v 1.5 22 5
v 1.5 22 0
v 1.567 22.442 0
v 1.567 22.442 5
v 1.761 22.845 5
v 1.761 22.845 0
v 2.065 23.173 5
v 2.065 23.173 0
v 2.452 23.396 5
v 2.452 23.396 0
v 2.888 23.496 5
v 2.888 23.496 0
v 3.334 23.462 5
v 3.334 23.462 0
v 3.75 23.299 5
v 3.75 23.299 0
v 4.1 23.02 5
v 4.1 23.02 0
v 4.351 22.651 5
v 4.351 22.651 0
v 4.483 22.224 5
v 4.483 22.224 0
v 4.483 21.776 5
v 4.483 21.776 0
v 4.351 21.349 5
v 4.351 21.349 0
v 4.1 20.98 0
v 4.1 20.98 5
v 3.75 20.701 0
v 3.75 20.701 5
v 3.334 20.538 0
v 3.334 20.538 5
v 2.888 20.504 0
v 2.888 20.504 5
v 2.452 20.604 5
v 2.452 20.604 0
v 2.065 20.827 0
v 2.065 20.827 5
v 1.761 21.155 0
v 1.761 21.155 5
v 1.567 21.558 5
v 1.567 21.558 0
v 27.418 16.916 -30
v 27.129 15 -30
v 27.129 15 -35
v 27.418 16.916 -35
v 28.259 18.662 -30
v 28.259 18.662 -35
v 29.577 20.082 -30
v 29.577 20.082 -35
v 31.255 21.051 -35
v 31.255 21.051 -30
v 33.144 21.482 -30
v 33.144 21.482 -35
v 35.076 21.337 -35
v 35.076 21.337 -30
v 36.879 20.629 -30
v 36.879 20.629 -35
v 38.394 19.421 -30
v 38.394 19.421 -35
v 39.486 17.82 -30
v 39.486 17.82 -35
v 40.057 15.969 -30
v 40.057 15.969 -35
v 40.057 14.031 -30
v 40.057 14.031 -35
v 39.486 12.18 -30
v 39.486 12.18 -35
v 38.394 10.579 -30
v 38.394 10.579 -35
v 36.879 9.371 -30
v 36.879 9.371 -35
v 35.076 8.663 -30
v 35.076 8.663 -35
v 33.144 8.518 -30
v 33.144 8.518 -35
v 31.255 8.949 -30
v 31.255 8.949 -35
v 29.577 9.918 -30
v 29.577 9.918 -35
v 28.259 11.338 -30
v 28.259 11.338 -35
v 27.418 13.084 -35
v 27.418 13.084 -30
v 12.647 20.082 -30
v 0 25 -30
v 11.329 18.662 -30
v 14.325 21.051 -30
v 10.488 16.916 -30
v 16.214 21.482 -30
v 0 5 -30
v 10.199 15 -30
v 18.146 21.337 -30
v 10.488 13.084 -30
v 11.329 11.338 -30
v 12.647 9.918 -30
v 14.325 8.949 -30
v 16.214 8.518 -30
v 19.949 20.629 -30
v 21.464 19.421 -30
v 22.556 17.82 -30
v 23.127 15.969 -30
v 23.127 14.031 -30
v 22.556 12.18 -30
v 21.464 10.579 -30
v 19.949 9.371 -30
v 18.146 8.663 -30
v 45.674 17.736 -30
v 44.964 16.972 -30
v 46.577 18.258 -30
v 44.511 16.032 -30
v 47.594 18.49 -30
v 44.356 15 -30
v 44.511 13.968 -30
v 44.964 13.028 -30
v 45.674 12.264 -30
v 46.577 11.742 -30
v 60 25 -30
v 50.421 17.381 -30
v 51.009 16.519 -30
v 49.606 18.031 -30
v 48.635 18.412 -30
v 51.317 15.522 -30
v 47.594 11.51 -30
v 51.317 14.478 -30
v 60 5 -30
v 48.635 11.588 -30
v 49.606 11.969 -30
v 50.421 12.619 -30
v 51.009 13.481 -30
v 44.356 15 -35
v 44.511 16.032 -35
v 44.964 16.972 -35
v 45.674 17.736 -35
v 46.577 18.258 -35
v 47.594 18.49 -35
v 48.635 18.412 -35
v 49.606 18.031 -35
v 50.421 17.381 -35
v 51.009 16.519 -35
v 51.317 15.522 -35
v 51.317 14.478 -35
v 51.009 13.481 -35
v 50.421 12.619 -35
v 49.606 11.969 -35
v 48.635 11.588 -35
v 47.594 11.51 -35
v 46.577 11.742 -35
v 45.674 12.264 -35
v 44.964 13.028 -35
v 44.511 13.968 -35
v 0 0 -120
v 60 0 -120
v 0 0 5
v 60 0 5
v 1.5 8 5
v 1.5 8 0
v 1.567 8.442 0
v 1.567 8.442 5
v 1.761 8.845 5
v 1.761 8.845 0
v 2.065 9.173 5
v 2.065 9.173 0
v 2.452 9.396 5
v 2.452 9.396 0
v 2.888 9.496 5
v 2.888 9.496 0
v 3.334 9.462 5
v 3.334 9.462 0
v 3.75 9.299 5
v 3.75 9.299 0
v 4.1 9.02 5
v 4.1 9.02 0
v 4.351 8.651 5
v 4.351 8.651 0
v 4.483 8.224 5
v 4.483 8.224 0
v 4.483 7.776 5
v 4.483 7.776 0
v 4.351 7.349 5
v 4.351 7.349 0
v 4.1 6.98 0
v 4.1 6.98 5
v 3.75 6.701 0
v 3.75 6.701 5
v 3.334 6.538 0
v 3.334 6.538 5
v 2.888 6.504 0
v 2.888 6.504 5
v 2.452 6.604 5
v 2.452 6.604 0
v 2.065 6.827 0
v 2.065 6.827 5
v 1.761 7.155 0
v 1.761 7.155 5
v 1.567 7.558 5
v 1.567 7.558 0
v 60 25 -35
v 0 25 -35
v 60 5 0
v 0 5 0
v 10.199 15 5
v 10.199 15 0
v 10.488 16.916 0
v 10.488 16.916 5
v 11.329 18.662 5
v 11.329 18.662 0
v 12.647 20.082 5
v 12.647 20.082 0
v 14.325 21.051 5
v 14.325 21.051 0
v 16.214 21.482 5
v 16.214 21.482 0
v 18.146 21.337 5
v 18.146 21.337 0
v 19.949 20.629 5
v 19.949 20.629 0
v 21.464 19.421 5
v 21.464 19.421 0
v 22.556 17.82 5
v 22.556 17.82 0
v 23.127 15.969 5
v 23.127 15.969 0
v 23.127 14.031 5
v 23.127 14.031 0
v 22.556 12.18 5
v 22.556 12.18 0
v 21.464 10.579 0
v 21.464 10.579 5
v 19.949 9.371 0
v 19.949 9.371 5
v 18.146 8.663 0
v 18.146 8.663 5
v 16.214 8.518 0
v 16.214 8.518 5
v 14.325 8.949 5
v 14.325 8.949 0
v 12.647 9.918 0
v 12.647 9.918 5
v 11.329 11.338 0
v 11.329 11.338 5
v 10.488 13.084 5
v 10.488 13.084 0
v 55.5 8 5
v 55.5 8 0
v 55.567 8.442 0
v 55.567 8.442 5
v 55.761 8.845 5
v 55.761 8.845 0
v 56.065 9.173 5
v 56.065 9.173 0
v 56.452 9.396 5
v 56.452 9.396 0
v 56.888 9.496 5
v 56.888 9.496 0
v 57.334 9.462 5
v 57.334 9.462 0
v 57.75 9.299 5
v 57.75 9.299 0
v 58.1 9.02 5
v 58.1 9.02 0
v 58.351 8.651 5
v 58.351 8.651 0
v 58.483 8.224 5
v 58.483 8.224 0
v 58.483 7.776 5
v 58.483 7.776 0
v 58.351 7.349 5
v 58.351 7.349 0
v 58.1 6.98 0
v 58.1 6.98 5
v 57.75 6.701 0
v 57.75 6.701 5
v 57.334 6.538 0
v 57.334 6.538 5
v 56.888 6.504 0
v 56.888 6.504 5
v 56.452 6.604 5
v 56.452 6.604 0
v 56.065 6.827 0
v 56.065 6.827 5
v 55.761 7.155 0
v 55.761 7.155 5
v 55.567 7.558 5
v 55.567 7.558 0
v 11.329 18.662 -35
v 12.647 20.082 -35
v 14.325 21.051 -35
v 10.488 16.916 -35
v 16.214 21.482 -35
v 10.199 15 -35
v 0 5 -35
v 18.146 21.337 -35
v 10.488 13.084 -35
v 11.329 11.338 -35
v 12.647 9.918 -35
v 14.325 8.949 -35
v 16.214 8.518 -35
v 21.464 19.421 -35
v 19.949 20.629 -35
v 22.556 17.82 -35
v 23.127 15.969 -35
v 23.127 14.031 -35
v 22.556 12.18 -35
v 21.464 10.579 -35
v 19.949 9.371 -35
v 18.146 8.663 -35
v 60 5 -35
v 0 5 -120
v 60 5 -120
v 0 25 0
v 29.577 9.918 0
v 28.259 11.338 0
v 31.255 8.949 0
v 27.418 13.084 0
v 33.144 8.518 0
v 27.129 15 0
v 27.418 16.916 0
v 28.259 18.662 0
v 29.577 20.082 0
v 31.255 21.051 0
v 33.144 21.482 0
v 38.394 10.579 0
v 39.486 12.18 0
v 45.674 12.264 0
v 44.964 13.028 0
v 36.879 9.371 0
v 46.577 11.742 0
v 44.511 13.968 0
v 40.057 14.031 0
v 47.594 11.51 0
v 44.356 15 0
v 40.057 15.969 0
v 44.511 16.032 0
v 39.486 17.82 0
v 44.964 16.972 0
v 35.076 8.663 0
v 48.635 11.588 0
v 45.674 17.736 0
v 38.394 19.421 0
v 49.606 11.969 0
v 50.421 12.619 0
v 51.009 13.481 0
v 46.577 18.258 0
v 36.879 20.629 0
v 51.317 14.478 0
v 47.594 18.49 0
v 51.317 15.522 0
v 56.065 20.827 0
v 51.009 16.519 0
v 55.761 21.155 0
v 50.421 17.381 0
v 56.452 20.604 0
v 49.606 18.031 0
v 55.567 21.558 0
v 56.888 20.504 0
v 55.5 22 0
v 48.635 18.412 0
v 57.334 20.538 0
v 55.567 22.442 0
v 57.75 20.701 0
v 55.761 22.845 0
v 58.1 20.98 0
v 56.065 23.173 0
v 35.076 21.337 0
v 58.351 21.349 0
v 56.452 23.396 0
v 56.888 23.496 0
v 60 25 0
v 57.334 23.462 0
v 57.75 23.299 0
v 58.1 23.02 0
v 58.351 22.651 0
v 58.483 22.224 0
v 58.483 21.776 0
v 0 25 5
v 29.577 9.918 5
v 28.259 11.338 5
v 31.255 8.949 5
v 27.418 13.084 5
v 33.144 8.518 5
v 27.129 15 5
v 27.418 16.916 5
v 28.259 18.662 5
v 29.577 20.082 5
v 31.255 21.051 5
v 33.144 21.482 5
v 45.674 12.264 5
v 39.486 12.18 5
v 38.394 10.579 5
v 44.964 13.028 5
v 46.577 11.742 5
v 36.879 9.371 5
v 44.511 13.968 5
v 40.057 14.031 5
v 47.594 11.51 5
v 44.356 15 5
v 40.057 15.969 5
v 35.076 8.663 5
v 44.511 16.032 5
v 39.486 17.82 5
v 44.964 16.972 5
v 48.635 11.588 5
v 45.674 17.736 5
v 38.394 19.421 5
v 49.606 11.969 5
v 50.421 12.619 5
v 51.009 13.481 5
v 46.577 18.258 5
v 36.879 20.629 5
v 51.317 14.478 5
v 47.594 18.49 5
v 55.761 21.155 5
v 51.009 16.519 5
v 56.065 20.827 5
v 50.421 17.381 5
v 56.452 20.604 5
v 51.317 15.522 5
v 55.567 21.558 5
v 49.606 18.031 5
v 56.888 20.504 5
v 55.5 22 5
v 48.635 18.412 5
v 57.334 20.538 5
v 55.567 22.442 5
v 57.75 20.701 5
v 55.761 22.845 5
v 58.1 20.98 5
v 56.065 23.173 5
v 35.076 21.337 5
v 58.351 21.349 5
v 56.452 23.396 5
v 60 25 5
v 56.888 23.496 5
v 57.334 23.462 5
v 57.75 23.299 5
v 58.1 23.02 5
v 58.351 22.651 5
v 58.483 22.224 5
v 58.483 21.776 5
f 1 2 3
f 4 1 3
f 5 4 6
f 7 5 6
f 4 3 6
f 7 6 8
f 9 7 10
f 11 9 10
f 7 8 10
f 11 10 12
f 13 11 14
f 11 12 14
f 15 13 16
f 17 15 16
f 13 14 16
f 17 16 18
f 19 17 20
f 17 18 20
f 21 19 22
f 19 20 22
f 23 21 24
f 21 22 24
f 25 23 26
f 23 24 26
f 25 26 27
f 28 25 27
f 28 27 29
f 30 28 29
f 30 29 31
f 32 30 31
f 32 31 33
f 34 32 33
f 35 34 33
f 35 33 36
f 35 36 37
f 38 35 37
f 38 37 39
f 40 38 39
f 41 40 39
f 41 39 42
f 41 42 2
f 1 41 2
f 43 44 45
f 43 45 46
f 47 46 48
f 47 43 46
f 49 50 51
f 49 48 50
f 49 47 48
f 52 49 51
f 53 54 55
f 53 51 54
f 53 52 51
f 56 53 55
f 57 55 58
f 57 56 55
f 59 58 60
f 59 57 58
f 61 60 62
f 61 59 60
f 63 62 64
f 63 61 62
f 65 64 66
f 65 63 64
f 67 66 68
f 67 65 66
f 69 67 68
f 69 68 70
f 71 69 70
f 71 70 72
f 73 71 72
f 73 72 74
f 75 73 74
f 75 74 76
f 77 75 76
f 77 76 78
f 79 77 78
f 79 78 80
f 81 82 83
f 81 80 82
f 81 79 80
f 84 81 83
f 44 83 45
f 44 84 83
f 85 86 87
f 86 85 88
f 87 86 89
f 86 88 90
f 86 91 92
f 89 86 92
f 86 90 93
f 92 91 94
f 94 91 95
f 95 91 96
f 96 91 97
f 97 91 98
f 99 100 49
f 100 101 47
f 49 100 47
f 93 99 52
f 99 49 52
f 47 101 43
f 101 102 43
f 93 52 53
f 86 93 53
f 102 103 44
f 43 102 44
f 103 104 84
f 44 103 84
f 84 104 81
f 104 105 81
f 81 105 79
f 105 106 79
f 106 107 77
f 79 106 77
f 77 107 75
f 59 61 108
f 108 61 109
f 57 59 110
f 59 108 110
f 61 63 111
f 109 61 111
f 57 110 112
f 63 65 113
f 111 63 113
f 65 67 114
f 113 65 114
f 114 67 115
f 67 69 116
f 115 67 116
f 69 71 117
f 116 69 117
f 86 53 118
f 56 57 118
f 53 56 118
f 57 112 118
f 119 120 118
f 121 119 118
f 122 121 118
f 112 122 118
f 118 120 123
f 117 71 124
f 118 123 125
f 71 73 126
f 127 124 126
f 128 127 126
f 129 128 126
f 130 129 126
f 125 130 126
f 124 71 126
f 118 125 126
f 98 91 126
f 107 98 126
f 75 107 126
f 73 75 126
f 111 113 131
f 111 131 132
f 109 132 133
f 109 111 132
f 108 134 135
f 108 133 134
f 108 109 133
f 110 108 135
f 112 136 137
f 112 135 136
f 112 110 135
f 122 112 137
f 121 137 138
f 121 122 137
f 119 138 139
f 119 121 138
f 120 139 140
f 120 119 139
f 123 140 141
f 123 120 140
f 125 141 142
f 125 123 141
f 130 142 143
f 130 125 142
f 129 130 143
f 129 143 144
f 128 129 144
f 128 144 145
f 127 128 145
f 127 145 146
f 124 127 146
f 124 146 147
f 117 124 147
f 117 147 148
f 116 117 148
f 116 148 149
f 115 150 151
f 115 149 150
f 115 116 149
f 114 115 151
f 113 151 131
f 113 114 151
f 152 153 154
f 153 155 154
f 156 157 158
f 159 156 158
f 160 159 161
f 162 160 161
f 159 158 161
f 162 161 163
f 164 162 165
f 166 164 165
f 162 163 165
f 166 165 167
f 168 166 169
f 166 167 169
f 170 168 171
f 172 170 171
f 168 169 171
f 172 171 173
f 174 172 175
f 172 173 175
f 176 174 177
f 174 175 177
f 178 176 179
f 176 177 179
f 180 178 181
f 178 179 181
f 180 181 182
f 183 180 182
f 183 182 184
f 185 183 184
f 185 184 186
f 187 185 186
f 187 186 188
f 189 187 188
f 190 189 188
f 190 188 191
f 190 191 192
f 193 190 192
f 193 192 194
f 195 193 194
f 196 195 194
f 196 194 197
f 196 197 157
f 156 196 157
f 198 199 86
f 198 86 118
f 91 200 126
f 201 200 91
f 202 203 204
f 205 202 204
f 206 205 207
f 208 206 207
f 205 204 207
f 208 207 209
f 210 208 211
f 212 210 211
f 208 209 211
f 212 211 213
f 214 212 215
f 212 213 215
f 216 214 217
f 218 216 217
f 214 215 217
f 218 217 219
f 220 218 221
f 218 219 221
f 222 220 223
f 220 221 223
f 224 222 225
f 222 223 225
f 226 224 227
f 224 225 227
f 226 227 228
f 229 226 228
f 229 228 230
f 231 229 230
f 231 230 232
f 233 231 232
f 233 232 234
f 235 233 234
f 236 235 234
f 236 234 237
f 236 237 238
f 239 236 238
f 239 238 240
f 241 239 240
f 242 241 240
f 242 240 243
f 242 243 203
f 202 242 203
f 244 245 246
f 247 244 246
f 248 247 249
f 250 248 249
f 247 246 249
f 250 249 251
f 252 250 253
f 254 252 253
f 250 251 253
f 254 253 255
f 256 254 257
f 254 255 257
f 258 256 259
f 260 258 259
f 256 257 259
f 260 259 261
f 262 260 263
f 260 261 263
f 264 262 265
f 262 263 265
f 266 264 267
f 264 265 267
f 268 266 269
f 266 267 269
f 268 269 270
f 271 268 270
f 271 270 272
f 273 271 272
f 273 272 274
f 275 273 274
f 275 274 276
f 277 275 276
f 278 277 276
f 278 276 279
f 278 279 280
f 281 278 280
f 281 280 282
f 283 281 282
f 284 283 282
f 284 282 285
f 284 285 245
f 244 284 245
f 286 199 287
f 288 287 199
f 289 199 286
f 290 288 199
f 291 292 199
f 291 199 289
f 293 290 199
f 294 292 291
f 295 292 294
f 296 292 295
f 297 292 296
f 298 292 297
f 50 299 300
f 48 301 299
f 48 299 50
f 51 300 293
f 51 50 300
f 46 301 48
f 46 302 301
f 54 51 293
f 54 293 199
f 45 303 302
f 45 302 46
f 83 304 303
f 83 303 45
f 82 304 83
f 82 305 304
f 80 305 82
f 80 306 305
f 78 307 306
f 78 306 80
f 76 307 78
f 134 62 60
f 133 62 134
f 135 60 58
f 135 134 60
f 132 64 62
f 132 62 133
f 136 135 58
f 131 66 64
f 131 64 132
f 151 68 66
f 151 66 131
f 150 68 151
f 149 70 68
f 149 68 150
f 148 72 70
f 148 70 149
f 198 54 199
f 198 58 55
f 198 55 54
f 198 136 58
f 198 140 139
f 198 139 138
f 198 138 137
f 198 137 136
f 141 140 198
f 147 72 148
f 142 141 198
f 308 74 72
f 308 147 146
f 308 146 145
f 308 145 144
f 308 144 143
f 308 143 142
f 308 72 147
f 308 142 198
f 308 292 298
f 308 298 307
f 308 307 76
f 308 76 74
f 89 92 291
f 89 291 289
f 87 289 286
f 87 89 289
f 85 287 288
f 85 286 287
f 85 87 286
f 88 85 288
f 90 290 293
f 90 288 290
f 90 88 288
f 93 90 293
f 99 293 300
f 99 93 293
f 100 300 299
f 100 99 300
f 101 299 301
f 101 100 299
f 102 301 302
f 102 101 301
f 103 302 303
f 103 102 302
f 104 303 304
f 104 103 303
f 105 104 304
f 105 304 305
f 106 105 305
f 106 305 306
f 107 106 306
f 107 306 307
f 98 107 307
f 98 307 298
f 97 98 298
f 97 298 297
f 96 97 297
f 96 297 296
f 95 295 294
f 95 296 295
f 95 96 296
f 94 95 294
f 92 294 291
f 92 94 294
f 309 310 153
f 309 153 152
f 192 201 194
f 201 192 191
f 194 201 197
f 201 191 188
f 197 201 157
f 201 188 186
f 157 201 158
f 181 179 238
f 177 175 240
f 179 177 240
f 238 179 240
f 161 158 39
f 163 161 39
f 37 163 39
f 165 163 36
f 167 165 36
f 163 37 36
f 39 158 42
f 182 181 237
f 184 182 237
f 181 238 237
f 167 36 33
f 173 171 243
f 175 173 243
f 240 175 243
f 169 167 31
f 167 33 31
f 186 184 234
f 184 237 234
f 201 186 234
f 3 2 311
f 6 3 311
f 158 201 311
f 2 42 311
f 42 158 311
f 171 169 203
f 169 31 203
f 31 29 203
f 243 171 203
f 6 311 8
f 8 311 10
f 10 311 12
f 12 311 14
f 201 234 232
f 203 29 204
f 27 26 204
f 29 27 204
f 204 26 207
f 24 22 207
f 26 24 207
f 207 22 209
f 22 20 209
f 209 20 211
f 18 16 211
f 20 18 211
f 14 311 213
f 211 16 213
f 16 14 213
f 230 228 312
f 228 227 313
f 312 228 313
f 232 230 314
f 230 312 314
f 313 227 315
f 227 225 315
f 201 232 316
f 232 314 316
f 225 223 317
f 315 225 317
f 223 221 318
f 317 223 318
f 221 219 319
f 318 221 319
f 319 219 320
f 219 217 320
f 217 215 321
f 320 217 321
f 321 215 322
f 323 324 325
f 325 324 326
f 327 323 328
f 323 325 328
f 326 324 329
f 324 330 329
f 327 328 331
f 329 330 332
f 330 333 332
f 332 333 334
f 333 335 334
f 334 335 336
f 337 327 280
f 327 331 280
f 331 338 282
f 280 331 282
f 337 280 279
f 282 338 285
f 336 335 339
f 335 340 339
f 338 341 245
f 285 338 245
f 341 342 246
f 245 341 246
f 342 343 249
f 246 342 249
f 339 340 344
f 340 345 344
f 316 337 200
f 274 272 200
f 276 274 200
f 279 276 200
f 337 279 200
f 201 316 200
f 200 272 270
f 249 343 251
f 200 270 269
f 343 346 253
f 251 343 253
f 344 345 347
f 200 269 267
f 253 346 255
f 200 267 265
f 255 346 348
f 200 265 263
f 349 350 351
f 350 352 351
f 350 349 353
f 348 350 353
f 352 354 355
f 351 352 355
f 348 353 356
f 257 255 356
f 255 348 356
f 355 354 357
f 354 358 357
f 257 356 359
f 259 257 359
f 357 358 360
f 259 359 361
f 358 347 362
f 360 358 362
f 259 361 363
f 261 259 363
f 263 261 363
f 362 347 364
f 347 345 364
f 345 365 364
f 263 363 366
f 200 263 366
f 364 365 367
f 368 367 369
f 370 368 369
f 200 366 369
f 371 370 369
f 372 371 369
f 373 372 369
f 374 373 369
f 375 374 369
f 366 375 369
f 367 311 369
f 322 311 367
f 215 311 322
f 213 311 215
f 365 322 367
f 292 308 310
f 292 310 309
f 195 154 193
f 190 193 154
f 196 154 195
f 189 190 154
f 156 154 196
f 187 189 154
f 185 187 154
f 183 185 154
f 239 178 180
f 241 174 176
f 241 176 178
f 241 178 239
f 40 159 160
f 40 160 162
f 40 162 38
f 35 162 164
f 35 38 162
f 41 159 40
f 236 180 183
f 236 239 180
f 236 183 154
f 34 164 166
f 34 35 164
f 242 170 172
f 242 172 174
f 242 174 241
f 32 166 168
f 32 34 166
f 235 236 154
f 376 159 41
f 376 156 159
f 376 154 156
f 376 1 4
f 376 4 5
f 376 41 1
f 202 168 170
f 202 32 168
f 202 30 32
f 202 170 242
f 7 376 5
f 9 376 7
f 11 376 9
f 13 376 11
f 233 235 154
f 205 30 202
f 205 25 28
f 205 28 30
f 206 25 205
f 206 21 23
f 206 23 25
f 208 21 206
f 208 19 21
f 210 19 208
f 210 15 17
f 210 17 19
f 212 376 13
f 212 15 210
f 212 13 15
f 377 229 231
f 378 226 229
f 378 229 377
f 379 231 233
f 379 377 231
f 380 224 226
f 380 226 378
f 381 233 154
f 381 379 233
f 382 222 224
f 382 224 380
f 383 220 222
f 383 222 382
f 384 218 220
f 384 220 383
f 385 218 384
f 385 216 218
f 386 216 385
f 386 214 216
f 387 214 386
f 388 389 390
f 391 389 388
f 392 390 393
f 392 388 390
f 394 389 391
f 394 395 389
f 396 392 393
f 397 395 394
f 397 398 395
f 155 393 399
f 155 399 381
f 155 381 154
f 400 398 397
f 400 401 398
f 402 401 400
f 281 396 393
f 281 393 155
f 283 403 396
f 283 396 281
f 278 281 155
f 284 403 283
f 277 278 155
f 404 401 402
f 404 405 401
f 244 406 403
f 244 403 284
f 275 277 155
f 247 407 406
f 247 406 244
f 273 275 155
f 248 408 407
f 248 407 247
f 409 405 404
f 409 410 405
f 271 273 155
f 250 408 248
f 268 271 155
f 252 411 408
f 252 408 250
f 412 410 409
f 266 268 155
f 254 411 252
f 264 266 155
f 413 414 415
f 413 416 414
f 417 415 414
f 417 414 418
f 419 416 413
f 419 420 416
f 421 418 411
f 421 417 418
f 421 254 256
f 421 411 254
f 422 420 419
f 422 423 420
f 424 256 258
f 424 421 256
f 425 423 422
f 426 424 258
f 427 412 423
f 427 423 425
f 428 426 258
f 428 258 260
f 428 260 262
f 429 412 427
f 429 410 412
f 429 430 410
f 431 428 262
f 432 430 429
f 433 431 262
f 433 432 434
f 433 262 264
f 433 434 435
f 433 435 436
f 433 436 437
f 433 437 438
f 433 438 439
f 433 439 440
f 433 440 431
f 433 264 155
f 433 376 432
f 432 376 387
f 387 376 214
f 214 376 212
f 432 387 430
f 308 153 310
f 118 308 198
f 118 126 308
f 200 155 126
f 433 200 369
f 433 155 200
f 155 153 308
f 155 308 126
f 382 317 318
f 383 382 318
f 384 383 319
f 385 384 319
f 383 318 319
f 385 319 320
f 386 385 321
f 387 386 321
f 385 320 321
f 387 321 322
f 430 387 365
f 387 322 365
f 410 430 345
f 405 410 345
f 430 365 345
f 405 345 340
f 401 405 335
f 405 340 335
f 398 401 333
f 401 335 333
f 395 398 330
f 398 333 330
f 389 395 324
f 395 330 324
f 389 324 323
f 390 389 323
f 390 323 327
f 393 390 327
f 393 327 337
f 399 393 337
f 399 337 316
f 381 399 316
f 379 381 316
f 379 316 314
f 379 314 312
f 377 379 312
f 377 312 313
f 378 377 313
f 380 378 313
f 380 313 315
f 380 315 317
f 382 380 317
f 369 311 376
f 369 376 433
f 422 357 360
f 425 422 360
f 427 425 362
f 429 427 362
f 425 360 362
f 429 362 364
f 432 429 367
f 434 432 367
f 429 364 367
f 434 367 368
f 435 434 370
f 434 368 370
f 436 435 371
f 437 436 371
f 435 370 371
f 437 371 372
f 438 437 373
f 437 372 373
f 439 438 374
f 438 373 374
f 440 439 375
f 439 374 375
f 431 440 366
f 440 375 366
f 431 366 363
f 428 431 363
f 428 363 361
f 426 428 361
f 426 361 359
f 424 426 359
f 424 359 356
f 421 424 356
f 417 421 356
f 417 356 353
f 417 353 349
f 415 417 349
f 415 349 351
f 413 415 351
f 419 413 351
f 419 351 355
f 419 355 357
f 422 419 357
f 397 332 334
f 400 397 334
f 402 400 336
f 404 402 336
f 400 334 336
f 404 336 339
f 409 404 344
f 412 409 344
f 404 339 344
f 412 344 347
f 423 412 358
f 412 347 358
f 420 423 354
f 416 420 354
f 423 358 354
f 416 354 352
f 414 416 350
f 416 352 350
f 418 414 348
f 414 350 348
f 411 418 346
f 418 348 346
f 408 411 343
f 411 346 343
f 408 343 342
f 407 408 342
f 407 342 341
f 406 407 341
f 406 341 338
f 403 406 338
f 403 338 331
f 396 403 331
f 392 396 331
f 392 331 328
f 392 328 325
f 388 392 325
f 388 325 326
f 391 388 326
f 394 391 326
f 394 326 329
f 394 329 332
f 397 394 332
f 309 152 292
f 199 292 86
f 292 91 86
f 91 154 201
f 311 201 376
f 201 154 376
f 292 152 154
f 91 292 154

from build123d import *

# Parameters (mm, degrees)
SKETCH_1_W               = 60
SKETCH_1_H               = 25
EXTRUDE_1_DEPTH          = 5
SKETCH_2_W               = 60
SKETCH_2_H               = 5
EXTRUDE_2_DEPTH          = 120
SKETCH_3_W               = 60
SKETCH_3_H               = 5
EXTRUDE_3_DEPTH          = 20
SKETCH_4_R               = 1.5
CUT_EXTRUDE_1_DEPTH      = 20
SKETCH_5_R               = 6.5
CUT_EXTRUDE_2_DEPTH      = 121
CUT_EXTRUDE_2_DEPTH_BACK = 6
SKETCH_6_R               = 3.5
CUT_EXTRUDE_3_DEPTH      = 121
CUT_EXTRUDE_3_DEPTH_BACK = 6


with BuildPart() as part:
    # 스케치1 → 보스-돌출1 (new body)
    with BuildSketch(Plane.XY):
        with Locations((30, 12.5)):
            Rectangle(SKETCH_1_W, SKETCH_1_H)
    extrude(amount=EXTRUDE_1_DEPTH)

    # 스케치2 → 보스-돌출2 (add)
    with BuildSketch(Plane(origin=(0, 0, 0), x_dir=(-1, 0, 0), z_dir=(0, 0, -1))):
        with Locations((-30, 2.5)):
            Rectangle(SKETCH_2_W, SKETCH_2_H)
    extrude(amount=EXTRUDE_2_DEPTH)

    # 스케치3 → 보스-돌출3 (add)
    with BuildSketch(Plane(origin=(0, 5, 0), x_dir=(1, 0, 0), z_dir=(0, 1, 0))):
        with Locations((30, 32.5)):
            Rectangle(SKETCH_3_W, SKETCH_3_H)
    extrude(amount=EXTRUDE_3_DEPTH)

    # 스케치4 → 컷-돌출1 (cut)
    with BuildSketch(Plane(origin=(0, 0, 0), x_dir=(-1, 0, 0), z_dir=(0, 0, -1))):
        with Locations((-57, 22)):
            Circle(SKETCH_4_R)
        with Locations((-57, 8)):
            Circle(SKETCH_4_R)
        with Locations((-3, 22)):
            Circle(SKETCH_4_R)
        with Locations((-3, 8)):
            Circle(SKETCH_4_R)
    extrude(amount=-CUT_EXTRUDE_1_DEPTH, mode=Mode.SUBTRACT)

    # 스케치5 → 컷-돌출2 (cut, two sides)
    with BuildSketch(Plane(origin=(0, 0, 0), x_dir=(-1, 0, 0), z_dir=(0, 0, -1))) as cut_extrude_2_sk:
        with Locations((-33.62939322, 15)):
            Circle(SKETCH_5_R)
        with Locations((-16.699372841, 15)):
            Circle(SKETCH_5_R)
    extrude(amount=CUT_EXTRUDE_2_DEPTH, mode=Mode.SUBTRACT)
    extrude(cut_extrude_2_sk.sketch, amount=-CUT_EXTRUDE_2_DEPTH_BACK, mode=Mode.SUBTRACT)

    # 스케치6 → 컷-돌출3 (cut, two sides)
    with BuildSketch(Plane(origin=(0, 0, 0), x_dir=(-1, 0, 0), z_dir=(0, 0, -1))) as cut_extrude_3_sk:
        with Locations((-47.855782548, 15)):
            Circle(SKETCH_6_R)
    extrude(amount=CUT_EXTRUDE_3_DEPTH, mode=Mode.SUBTRACT)
    extrude(cut_extrude_3_sk.sketch, amount=-CUT_EXTRUDE_3_DEPTH_BACK, mode=Mode.SUBTRACT)


solid = part.part
